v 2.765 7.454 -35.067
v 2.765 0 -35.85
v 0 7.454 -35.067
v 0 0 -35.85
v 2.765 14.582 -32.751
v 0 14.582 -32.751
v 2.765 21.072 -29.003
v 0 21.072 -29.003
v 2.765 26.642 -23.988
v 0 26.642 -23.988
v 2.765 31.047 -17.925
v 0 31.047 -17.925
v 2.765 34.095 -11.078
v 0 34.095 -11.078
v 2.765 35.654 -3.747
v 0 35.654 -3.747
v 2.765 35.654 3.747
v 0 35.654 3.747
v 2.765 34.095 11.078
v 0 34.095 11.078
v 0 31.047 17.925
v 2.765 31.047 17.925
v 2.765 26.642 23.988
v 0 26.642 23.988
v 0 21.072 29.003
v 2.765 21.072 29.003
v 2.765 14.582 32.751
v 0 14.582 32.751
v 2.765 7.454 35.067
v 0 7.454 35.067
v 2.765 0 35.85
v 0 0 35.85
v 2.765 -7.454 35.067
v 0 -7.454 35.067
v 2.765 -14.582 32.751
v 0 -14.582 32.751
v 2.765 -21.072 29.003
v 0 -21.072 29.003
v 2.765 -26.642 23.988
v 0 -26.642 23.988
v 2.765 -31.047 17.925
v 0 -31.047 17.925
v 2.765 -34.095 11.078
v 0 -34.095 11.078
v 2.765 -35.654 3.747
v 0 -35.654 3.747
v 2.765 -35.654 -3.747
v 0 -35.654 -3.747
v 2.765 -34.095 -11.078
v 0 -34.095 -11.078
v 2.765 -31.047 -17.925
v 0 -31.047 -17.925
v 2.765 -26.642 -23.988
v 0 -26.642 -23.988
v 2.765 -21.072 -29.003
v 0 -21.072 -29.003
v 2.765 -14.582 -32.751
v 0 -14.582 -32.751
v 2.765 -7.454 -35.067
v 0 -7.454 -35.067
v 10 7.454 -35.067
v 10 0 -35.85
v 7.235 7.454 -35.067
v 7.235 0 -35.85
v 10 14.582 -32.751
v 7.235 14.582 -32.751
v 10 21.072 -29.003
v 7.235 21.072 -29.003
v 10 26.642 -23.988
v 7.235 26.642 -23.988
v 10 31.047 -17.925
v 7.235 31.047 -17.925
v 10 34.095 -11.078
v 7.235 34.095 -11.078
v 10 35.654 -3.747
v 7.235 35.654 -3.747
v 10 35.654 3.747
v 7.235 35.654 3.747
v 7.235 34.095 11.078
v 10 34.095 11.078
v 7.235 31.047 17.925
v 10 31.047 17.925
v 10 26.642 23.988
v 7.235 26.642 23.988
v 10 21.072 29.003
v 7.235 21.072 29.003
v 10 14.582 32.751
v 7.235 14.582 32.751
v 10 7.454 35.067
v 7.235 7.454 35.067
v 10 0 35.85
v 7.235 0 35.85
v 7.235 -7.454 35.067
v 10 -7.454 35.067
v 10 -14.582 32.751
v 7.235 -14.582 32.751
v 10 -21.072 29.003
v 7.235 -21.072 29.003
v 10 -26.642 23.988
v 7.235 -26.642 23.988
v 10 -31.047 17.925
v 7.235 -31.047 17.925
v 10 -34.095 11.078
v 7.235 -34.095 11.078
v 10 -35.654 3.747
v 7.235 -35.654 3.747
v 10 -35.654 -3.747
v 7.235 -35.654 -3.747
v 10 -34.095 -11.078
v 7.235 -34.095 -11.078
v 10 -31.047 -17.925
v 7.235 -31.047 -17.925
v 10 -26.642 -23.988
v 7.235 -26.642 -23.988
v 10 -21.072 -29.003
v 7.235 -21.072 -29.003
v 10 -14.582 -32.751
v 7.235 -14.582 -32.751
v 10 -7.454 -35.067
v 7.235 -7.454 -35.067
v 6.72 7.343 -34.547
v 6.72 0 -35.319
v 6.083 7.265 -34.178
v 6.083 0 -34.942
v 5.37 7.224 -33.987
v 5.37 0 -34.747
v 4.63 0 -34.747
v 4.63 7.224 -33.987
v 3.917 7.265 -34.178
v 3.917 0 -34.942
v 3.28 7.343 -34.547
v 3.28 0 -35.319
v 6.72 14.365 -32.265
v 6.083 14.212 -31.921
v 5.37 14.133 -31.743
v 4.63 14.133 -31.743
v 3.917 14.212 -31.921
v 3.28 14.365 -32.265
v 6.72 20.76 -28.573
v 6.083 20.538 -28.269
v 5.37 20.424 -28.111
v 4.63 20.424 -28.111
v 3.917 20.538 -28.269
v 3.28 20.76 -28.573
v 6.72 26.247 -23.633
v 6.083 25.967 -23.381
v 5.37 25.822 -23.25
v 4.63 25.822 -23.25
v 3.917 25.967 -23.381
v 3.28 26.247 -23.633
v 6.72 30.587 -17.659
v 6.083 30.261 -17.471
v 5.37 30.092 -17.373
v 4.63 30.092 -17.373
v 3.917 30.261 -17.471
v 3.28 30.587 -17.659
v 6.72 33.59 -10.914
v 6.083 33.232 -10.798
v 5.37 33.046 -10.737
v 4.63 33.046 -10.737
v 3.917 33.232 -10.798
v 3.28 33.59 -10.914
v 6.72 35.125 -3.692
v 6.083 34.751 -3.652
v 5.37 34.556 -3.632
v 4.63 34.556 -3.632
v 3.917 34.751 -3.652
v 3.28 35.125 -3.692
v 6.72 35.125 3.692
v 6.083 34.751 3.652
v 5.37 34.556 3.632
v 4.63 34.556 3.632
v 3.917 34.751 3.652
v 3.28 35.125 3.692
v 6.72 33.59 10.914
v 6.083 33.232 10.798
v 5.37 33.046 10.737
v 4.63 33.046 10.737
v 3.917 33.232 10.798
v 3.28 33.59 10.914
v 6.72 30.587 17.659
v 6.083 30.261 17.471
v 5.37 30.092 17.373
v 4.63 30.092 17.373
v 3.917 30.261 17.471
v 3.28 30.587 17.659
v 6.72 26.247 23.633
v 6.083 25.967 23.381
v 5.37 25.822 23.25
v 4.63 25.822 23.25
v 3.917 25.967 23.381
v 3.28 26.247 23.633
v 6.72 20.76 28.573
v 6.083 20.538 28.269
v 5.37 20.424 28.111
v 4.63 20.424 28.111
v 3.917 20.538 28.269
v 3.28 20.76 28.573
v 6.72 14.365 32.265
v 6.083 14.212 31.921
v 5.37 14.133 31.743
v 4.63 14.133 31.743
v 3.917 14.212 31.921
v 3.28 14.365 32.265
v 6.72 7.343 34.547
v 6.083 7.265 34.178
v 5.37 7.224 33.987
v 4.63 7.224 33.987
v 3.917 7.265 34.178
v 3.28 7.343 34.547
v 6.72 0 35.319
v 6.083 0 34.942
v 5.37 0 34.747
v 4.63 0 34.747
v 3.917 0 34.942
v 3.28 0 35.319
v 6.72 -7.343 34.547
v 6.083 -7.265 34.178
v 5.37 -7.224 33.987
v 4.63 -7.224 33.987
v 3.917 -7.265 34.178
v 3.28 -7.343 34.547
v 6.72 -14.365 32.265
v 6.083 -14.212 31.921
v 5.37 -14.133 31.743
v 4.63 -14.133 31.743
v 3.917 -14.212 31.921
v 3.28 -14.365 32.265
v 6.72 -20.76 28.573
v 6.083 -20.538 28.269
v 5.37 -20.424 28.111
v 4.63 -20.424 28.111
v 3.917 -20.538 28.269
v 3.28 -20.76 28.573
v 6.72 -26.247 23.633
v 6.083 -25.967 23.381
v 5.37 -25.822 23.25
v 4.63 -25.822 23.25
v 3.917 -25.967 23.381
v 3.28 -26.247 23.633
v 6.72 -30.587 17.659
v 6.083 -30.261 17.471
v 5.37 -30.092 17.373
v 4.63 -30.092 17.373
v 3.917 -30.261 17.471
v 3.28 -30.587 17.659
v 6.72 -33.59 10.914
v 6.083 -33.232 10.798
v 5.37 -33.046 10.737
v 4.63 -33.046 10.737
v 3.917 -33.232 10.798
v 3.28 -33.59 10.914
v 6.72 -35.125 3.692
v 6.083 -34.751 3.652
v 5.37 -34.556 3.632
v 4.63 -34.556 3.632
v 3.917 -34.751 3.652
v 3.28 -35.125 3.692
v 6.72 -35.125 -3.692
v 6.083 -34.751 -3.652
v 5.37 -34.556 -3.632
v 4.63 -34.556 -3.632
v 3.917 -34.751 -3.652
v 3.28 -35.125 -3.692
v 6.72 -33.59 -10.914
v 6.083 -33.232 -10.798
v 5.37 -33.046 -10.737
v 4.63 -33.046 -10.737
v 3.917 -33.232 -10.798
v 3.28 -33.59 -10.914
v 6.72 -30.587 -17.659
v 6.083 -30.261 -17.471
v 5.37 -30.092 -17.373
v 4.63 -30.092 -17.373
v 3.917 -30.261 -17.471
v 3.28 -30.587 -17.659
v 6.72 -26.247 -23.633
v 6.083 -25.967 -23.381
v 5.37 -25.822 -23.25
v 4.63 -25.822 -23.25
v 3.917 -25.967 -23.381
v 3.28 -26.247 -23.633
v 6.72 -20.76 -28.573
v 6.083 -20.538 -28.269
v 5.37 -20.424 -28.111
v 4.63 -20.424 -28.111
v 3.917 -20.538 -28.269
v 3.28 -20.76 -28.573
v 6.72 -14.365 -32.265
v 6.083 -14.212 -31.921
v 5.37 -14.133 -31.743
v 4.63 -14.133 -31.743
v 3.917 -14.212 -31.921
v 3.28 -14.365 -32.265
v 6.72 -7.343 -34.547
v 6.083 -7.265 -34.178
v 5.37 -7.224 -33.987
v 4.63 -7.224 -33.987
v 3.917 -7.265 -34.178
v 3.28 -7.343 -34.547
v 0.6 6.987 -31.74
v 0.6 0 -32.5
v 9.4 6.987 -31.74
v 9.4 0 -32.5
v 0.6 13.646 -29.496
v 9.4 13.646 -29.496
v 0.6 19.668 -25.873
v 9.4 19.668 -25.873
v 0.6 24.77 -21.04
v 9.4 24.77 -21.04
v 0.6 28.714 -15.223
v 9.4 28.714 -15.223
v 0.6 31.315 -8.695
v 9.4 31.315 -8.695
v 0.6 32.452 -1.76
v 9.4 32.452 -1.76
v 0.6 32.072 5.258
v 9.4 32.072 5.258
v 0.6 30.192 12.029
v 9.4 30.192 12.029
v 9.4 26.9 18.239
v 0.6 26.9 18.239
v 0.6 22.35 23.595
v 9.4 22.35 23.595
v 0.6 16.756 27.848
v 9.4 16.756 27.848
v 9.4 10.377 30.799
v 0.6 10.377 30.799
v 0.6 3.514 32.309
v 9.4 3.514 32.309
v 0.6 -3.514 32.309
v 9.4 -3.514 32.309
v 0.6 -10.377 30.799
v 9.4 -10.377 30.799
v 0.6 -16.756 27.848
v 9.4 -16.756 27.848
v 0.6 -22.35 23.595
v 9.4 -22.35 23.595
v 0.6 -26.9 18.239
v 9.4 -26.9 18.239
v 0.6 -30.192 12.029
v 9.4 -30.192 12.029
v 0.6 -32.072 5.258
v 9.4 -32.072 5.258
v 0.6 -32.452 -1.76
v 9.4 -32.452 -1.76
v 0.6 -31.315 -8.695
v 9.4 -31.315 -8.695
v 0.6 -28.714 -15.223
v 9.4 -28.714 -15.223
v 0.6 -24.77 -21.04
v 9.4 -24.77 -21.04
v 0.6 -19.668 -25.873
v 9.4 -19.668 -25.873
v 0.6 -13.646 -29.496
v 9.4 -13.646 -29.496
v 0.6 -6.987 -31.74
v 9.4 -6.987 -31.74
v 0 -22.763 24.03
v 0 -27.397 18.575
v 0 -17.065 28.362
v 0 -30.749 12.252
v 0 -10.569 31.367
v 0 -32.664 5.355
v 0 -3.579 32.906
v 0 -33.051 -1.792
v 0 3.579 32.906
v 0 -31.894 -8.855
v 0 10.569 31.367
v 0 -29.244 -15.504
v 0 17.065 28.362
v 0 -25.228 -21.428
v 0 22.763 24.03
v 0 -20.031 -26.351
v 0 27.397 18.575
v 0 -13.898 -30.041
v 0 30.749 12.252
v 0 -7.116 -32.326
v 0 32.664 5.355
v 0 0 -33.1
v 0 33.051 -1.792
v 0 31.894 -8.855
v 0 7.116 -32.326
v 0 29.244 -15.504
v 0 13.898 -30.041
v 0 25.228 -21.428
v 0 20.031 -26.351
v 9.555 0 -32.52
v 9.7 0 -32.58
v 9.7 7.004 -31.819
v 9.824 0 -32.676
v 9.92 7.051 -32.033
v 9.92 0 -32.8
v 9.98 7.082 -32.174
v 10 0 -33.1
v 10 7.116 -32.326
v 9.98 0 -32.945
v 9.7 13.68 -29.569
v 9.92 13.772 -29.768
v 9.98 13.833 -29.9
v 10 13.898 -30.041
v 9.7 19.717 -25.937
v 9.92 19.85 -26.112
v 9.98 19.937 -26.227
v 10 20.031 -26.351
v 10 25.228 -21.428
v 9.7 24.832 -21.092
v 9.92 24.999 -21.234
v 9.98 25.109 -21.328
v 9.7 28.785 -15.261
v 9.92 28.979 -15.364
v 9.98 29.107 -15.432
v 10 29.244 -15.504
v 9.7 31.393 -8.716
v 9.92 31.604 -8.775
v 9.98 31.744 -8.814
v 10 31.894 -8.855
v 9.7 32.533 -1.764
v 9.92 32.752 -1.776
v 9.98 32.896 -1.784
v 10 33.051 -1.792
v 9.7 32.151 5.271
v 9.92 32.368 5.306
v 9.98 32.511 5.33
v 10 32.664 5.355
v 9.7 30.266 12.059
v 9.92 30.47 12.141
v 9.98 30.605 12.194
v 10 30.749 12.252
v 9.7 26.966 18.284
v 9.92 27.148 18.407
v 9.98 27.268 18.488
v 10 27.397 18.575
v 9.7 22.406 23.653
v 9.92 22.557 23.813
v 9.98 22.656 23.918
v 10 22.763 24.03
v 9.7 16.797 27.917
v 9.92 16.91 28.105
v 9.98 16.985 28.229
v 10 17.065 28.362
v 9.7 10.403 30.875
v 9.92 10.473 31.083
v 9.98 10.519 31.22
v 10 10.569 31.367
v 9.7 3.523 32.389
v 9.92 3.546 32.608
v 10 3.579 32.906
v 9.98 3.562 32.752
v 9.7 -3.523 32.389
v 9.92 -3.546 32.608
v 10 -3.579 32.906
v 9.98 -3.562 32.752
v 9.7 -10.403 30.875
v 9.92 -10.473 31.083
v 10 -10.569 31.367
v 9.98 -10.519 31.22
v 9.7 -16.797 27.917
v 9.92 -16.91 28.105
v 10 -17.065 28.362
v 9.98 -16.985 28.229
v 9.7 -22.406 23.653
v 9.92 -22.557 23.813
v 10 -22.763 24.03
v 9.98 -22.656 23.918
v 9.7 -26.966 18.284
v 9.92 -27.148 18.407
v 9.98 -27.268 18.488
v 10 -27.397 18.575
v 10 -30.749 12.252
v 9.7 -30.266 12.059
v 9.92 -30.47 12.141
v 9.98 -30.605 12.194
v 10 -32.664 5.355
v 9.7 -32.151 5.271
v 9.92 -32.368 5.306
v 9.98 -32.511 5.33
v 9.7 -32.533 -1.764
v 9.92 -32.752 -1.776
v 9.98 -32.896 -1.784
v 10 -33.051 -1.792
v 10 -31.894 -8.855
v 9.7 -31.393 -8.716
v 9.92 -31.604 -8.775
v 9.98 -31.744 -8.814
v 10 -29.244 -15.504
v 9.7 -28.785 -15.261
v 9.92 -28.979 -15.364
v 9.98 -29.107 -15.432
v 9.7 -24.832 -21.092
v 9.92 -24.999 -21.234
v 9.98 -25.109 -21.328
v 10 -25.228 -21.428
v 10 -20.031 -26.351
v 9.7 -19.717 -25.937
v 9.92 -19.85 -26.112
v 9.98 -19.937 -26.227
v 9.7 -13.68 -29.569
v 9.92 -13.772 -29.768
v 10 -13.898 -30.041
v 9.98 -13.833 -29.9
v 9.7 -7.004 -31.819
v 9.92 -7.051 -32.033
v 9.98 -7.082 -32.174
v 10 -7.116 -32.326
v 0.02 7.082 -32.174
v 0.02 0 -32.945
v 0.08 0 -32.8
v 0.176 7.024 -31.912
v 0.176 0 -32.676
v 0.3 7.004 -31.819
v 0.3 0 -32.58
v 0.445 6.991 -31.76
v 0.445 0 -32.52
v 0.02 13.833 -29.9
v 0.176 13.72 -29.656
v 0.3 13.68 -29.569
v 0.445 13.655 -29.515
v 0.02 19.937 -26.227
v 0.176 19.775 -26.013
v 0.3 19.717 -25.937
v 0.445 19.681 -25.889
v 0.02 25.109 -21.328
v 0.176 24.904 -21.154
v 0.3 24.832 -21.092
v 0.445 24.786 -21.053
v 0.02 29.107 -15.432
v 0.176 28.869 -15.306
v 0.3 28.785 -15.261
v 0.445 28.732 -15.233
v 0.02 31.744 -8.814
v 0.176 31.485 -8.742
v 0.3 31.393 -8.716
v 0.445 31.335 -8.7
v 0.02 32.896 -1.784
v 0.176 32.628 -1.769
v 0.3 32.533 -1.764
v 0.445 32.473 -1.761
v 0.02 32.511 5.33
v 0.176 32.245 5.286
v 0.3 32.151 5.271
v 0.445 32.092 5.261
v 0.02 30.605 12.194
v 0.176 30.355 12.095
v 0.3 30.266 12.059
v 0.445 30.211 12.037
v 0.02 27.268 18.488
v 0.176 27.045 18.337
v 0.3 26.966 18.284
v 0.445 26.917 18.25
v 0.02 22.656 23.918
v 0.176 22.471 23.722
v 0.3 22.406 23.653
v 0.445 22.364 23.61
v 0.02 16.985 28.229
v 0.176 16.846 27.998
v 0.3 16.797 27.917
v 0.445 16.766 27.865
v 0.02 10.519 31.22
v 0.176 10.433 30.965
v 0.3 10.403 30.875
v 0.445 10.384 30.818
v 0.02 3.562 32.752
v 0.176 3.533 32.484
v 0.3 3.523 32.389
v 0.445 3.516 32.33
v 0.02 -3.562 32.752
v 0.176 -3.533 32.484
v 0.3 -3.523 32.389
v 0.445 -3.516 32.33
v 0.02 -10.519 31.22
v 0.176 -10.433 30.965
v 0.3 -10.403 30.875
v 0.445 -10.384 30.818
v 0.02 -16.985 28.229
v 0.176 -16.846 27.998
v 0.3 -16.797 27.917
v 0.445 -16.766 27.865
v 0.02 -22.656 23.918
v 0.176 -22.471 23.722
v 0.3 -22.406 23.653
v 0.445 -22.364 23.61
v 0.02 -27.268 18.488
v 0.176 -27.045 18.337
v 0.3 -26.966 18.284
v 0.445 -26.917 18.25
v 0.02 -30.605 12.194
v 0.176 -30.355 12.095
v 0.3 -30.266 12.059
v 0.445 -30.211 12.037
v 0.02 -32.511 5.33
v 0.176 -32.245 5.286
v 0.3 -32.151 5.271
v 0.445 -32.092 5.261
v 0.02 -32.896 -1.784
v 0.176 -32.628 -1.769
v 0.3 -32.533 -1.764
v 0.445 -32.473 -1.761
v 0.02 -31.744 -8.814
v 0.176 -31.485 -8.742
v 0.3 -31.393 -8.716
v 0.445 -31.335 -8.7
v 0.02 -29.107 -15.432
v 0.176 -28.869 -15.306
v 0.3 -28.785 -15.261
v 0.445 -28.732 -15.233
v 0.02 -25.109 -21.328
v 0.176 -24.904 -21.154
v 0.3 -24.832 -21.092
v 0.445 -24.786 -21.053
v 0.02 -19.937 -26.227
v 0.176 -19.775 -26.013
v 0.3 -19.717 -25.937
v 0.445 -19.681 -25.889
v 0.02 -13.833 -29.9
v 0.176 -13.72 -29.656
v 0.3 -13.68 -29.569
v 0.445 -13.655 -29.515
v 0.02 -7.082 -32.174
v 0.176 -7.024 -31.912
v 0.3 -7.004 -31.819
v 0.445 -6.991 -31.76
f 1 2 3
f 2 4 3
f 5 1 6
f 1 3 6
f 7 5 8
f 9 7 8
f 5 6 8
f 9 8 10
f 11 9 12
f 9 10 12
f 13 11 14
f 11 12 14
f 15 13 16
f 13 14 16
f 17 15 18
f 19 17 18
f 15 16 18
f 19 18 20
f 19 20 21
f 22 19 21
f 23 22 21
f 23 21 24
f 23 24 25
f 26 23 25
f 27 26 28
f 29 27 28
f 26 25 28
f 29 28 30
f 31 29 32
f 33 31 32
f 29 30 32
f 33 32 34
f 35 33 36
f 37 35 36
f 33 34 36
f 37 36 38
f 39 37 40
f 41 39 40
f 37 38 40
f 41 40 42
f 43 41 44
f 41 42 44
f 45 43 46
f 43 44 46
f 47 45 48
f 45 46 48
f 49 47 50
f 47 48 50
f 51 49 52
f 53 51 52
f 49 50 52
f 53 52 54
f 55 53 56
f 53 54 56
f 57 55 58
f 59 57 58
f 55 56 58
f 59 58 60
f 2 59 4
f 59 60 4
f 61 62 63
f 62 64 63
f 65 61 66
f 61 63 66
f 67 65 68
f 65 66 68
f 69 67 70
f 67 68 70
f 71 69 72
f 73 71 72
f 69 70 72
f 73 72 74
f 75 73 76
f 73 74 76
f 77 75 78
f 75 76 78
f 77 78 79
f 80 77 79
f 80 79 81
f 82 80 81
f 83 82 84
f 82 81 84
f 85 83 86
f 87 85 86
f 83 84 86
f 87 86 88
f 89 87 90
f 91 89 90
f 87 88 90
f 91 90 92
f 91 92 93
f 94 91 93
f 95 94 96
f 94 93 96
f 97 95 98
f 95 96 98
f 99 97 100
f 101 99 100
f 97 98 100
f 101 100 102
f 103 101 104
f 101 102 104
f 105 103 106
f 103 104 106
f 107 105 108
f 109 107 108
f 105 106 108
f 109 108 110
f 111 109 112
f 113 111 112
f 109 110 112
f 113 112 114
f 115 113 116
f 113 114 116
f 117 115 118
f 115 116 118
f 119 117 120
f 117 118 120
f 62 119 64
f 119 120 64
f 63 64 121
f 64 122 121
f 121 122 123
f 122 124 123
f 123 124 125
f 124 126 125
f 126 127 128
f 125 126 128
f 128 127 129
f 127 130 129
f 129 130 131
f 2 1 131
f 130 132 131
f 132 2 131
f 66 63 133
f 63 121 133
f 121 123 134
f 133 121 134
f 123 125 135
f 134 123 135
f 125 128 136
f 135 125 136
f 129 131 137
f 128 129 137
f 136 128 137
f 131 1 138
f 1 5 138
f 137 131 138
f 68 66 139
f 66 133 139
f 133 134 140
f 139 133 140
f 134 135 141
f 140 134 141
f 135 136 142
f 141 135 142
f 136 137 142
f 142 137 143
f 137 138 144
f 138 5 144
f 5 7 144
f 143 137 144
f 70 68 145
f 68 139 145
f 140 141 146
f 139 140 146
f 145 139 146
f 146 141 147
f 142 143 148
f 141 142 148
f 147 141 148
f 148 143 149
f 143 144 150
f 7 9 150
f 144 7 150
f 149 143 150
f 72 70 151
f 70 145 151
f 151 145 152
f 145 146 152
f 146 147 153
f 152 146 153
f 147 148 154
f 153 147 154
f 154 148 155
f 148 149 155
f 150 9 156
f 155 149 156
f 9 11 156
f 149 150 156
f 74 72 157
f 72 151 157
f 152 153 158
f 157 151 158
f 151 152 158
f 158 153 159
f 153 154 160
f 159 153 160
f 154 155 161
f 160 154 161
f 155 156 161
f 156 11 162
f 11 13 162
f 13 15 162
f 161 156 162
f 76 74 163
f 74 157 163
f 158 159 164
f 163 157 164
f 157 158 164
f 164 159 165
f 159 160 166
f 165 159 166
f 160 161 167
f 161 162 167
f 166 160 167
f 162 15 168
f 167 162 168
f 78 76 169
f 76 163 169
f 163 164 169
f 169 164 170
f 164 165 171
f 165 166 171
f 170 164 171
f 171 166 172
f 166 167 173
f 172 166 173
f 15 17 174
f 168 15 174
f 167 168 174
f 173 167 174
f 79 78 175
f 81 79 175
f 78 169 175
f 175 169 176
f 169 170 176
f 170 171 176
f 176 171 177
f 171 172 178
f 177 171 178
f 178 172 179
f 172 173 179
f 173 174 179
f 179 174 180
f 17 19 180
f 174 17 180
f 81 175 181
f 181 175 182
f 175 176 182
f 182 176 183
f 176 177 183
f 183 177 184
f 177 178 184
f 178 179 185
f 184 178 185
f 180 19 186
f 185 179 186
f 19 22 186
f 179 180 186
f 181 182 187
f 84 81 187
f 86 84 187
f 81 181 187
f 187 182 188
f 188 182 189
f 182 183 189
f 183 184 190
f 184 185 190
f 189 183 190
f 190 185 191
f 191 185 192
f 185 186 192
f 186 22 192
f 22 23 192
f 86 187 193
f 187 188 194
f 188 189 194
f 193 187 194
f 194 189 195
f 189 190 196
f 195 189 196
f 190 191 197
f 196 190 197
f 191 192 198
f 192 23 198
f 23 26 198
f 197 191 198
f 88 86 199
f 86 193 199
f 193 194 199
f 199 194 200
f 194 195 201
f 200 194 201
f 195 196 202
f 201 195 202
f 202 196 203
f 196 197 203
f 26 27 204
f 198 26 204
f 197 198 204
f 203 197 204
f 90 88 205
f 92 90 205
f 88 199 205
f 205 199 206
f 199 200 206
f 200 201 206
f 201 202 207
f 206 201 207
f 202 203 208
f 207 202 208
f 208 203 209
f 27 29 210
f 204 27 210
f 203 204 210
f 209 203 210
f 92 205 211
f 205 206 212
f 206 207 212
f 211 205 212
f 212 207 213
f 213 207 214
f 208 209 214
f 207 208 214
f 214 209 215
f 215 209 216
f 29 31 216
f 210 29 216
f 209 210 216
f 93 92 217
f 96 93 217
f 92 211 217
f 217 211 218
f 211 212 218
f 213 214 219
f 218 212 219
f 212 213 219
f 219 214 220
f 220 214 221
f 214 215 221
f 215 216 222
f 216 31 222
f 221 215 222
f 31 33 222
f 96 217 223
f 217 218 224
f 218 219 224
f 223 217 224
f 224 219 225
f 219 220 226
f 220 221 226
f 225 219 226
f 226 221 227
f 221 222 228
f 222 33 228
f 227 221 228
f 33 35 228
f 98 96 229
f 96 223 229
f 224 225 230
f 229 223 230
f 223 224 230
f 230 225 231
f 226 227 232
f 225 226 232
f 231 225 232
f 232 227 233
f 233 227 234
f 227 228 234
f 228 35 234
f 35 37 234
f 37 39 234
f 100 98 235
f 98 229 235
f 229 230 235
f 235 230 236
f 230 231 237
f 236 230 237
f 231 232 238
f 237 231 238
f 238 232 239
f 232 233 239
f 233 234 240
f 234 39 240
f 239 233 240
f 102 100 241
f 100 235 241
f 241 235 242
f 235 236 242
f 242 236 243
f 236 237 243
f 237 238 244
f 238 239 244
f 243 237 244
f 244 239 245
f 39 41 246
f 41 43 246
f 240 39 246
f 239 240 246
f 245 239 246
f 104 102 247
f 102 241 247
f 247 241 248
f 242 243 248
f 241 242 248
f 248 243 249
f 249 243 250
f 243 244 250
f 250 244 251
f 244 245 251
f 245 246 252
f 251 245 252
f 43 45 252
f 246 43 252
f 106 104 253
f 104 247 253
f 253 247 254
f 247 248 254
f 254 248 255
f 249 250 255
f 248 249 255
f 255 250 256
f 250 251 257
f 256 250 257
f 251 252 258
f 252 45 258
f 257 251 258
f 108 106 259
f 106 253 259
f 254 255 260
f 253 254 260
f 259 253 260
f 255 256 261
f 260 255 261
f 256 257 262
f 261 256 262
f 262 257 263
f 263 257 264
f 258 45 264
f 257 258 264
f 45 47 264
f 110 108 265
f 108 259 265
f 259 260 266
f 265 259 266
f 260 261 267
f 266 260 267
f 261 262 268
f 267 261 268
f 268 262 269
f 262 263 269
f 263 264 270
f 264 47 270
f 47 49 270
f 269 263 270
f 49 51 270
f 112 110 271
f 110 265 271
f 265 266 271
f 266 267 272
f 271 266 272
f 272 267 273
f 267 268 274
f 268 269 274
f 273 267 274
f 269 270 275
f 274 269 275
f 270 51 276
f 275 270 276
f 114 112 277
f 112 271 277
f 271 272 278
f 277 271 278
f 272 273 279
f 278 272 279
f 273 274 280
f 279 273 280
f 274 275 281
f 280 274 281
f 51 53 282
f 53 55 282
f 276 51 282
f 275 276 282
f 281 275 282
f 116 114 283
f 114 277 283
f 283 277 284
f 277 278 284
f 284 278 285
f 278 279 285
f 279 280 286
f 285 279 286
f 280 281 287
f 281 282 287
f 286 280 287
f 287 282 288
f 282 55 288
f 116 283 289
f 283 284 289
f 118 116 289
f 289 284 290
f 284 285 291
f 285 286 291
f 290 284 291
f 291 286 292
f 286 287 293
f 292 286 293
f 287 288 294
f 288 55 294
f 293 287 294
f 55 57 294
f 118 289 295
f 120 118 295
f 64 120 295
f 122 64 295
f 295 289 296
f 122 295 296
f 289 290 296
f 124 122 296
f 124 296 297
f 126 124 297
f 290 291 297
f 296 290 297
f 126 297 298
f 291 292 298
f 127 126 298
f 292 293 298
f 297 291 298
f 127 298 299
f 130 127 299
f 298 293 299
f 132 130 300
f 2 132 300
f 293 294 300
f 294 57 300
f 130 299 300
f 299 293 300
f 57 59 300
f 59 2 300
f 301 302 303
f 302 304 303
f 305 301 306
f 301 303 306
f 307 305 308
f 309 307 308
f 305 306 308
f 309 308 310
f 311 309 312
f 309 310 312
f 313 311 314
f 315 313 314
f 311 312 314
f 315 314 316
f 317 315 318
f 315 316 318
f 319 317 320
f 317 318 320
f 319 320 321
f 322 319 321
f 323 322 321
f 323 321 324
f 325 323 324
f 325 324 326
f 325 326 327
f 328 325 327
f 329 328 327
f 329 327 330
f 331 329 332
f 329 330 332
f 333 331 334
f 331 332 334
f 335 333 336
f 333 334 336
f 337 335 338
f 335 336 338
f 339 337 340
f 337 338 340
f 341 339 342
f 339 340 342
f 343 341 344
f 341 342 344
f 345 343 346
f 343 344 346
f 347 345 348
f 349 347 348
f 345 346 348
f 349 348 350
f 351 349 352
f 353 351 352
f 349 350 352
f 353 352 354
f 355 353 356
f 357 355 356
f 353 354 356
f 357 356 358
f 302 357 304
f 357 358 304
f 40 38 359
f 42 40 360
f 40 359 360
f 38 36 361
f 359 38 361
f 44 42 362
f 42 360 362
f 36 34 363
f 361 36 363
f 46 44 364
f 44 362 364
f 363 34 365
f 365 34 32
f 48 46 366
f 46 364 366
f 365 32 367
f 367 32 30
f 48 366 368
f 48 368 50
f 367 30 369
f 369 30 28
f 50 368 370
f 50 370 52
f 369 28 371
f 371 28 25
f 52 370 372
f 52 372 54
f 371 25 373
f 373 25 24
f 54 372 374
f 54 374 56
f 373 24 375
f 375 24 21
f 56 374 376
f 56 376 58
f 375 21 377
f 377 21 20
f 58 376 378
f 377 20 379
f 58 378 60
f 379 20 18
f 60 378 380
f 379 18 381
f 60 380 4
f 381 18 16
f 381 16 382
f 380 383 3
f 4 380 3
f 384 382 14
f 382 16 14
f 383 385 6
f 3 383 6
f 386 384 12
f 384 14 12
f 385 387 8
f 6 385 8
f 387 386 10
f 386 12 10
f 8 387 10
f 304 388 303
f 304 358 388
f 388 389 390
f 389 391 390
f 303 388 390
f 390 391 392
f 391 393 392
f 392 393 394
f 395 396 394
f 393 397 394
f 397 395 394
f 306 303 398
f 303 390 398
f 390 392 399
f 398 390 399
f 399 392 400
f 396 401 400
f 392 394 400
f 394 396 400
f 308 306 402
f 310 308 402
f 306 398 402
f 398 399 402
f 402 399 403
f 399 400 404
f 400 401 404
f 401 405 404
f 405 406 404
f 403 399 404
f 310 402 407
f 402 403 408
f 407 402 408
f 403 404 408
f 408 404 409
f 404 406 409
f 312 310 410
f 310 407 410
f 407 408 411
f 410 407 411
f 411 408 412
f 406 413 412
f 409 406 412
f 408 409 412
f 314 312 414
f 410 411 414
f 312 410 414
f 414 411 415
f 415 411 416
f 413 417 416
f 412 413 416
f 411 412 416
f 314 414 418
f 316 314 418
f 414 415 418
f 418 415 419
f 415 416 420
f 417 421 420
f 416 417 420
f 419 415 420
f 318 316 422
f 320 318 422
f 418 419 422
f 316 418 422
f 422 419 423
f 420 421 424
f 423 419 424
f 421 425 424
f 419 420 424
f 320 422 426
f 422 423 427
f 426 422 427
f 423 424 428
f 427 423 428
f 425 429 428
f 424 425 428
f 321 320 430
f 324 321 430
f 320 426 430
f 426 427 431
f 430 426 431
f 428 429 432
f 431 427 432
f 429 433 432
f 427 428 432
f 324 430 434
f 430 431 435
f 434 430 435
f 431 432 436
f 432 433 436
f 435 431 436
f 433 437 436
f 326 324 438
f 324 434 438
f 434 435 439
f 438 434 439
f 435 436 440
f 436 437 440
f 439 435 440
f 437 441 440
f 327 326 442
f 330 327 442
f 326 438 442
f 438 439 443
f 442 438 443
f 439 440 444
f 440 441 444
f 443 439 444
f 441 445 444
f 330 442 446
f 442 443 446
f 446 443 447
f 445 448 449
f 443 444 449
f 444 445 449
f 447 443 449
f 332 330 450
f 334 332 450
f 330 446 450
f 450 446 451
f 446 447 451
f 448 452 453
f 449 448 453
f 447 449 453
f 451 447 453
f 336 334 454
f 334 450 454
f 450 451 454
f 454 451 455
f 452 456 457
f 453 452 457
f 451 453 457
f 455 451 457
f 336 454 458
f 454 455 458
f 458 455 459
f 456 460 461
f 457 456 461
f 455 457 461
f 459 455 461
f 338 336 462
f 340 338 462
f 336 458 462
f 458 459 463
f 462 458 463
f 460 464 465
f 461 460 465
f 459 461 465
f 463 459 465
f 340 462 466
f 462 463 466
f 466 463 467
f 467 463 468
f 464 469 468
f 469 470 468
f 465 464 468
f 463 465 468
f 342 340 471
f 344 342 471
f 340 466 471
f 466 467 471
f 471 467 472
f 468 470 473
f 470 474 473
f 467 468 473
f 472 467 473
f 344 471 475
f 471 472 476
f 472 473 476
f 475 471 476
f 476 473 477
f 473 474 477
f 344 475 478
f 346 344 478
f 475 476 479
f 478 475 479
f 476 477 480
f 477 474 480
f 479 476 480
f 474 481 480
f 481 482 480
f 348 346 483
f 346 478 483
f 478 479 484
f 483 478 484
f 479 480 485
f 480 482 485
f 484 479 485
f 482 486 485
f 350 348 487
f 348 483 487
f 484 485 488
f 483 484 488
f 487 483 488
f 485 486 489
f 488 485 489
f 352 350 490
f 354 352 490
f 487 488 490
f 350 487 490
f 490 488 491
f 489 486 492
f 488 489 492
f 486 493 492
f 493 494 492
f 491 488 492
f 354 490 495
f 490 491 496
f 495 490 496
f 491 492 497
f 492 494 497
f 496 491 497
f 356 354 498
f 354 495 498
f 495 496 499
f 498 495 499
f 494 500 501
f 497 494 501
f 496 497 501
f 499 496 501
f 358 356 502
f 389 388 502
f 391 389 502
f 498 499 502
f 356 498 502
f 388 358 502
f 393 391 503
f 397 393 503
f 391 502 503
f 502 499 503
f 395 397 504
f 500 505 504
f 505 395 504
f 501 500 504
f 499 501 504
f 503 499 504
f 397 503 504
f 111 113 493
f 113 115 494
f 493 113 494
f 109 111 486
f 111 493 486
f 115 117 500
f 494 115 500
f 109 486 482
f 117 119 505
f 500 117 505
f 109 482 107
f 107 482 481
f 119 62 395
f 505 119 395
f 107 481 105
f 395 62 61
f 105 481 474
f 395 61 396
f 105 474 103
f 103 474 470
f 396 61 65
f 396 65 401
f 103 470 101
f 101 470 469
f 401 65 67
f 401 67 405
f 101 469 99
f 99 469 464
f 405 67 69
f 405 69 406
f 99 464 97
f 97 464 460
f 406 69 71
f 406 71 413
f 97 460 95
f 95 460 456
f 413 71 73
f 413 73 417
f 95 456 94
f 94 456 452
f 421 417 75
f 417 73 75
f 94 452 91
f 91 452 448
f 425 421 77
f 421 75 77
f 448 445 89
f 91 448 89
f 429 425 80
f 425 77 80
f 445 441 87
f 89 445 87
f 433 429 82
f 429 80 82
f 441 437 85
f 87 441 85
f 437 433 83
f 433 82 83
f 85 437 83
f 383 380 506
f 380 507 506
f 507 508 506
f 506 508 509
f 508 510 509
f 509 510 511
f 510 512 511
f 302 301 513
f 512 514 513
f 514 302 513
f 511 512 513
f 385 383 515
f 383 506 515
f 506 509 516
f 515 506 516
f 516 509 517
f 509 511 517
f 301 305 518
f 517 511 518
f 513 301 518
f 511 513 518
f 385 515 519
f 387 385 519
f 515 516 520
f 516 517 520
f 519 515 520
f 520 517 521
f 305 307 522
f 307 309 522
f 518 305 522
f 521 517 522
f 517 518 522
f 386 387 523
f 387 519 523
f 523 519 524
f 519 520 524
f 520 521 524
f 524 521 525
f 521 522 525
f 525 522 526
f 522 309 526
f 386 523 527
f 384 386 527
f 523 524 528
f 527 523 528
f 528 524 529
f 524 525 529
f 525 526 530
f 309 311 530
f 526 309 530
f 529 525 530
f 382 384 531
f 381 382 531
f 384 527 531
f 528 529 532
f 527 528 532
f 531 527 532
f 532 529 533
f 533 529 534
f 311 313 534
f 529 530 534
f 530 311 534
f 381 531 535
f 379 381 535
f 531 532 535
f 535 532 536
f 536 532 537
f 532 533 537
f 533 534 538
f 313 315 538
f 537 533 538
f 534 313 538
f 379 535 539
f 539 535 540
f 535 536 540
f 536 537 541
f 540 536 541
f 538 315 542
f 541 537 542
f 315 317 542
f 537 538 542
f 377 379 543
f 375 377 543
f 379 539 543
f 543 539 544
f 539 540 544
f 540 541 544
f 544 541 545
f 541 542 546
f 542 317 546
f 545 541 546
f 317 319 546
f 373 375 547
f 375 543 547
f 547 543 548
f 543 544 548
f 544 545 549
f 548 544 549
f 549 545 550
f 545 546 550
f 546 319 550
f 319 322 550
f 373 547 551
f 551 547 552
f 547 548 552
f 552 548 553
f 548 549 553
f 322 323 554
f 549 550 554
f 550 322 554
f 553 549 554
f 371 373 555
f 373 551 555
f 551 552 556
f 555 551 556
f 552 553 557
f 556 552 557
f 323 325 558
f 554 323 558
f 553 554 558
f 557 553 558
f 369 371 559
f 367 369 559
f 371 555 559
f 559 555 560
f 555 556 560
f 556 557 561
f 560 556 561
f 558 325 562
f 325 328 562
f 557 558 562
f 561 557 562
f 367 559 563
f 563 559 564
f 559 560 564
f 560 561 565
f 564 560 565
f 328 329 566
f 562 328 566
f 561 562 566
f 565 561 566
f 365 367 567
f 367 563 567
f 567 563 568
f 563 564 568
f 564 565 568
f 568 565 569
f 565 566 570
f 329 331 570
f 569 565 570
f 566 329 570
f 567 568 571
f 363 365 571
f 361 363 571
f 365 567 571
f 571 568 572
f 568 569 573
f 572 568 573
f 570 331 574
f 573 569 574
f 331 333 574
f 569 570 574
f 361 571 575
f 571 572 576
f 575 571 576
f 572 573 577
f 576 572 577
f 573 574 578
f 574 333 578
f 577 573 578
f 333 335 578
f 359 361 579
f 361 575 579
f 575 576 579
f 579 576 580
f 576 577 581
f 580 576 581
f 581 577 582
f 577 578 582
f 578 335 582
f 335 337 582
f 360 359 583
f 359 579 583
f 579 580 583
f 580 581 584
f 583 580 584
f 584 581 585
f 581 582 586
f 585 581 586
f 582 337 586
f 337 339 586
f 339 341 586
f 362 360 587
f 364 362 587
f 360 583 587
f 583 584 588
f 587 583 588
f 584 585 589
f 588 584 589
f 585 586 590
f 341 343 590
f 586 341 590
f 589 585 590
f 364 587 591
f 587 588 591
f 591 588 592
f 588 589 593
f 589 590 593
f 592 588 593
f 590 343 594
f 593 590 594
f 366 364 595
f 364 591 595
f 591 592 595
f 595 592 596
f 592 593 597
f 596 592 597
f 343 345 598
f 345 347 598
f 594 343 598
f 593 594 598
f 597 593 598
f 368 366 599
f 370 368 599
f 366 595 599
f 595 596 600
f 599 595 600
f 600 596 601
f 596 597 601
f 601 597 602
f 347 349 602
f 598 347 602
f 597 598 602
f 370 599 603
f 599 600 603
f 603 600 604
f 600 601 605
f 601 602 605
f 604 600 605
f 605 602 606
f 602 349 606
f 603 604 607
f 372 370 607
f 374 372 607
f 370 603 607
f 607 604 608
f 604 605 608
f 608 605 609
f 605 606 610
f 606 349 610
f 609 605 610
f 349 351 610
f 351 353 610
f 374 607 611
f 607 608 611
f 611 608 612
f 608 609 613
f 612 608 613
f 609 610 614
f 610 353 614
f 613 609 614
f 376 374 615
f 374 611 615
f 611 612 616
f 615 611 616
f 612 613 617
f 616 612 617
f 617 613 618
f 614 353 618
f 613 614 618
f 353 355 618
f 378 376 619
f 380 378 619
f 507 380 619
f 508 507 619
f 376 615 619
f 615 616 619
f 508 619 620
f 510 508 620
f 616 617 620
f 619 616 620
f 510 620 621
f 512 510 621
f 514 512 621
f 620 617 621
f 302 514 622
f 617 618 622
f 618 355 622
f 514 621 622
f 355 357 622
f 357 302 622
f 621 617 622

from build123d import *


with BuildPart() as part:
    # 草图1 → 旋转1 (revolve)
    with BuildSketch(Plane.XY, mode=Mode.PRIVATE) as revolve_1_sk:
        with BuildLine():
            Line((0, 35.85), (0, 33.1))
            ThreePointArc((0, 33.1), (0.175735931, 32.675735931), (0.6, 32.5))
            Line((0.6, 32.5), (9.4, 32.5))
            ThreePointArc((9.4, 32.5), (9.824264069, 32.675735931), (10, 33.1))
            Line((10, 33.1), (10, 35.85))
            Line((10, 35.85), (7.23490134, 35.85))
            ThreePointArc((7.23490134, 35.85), (5, 34.722), (2.76509866, 35.85))
            Line((2.76509866, 35.85), (0, 35.85))
        make_face()
    revolve(revolve_1_sk.sketch.rotate(Axis((-0.001266185, 0, 0), (1, 0, 0)), 270), axis=Axis((-0.001266185, 0, 0), (1, 0, 0)))


solid = part.part
